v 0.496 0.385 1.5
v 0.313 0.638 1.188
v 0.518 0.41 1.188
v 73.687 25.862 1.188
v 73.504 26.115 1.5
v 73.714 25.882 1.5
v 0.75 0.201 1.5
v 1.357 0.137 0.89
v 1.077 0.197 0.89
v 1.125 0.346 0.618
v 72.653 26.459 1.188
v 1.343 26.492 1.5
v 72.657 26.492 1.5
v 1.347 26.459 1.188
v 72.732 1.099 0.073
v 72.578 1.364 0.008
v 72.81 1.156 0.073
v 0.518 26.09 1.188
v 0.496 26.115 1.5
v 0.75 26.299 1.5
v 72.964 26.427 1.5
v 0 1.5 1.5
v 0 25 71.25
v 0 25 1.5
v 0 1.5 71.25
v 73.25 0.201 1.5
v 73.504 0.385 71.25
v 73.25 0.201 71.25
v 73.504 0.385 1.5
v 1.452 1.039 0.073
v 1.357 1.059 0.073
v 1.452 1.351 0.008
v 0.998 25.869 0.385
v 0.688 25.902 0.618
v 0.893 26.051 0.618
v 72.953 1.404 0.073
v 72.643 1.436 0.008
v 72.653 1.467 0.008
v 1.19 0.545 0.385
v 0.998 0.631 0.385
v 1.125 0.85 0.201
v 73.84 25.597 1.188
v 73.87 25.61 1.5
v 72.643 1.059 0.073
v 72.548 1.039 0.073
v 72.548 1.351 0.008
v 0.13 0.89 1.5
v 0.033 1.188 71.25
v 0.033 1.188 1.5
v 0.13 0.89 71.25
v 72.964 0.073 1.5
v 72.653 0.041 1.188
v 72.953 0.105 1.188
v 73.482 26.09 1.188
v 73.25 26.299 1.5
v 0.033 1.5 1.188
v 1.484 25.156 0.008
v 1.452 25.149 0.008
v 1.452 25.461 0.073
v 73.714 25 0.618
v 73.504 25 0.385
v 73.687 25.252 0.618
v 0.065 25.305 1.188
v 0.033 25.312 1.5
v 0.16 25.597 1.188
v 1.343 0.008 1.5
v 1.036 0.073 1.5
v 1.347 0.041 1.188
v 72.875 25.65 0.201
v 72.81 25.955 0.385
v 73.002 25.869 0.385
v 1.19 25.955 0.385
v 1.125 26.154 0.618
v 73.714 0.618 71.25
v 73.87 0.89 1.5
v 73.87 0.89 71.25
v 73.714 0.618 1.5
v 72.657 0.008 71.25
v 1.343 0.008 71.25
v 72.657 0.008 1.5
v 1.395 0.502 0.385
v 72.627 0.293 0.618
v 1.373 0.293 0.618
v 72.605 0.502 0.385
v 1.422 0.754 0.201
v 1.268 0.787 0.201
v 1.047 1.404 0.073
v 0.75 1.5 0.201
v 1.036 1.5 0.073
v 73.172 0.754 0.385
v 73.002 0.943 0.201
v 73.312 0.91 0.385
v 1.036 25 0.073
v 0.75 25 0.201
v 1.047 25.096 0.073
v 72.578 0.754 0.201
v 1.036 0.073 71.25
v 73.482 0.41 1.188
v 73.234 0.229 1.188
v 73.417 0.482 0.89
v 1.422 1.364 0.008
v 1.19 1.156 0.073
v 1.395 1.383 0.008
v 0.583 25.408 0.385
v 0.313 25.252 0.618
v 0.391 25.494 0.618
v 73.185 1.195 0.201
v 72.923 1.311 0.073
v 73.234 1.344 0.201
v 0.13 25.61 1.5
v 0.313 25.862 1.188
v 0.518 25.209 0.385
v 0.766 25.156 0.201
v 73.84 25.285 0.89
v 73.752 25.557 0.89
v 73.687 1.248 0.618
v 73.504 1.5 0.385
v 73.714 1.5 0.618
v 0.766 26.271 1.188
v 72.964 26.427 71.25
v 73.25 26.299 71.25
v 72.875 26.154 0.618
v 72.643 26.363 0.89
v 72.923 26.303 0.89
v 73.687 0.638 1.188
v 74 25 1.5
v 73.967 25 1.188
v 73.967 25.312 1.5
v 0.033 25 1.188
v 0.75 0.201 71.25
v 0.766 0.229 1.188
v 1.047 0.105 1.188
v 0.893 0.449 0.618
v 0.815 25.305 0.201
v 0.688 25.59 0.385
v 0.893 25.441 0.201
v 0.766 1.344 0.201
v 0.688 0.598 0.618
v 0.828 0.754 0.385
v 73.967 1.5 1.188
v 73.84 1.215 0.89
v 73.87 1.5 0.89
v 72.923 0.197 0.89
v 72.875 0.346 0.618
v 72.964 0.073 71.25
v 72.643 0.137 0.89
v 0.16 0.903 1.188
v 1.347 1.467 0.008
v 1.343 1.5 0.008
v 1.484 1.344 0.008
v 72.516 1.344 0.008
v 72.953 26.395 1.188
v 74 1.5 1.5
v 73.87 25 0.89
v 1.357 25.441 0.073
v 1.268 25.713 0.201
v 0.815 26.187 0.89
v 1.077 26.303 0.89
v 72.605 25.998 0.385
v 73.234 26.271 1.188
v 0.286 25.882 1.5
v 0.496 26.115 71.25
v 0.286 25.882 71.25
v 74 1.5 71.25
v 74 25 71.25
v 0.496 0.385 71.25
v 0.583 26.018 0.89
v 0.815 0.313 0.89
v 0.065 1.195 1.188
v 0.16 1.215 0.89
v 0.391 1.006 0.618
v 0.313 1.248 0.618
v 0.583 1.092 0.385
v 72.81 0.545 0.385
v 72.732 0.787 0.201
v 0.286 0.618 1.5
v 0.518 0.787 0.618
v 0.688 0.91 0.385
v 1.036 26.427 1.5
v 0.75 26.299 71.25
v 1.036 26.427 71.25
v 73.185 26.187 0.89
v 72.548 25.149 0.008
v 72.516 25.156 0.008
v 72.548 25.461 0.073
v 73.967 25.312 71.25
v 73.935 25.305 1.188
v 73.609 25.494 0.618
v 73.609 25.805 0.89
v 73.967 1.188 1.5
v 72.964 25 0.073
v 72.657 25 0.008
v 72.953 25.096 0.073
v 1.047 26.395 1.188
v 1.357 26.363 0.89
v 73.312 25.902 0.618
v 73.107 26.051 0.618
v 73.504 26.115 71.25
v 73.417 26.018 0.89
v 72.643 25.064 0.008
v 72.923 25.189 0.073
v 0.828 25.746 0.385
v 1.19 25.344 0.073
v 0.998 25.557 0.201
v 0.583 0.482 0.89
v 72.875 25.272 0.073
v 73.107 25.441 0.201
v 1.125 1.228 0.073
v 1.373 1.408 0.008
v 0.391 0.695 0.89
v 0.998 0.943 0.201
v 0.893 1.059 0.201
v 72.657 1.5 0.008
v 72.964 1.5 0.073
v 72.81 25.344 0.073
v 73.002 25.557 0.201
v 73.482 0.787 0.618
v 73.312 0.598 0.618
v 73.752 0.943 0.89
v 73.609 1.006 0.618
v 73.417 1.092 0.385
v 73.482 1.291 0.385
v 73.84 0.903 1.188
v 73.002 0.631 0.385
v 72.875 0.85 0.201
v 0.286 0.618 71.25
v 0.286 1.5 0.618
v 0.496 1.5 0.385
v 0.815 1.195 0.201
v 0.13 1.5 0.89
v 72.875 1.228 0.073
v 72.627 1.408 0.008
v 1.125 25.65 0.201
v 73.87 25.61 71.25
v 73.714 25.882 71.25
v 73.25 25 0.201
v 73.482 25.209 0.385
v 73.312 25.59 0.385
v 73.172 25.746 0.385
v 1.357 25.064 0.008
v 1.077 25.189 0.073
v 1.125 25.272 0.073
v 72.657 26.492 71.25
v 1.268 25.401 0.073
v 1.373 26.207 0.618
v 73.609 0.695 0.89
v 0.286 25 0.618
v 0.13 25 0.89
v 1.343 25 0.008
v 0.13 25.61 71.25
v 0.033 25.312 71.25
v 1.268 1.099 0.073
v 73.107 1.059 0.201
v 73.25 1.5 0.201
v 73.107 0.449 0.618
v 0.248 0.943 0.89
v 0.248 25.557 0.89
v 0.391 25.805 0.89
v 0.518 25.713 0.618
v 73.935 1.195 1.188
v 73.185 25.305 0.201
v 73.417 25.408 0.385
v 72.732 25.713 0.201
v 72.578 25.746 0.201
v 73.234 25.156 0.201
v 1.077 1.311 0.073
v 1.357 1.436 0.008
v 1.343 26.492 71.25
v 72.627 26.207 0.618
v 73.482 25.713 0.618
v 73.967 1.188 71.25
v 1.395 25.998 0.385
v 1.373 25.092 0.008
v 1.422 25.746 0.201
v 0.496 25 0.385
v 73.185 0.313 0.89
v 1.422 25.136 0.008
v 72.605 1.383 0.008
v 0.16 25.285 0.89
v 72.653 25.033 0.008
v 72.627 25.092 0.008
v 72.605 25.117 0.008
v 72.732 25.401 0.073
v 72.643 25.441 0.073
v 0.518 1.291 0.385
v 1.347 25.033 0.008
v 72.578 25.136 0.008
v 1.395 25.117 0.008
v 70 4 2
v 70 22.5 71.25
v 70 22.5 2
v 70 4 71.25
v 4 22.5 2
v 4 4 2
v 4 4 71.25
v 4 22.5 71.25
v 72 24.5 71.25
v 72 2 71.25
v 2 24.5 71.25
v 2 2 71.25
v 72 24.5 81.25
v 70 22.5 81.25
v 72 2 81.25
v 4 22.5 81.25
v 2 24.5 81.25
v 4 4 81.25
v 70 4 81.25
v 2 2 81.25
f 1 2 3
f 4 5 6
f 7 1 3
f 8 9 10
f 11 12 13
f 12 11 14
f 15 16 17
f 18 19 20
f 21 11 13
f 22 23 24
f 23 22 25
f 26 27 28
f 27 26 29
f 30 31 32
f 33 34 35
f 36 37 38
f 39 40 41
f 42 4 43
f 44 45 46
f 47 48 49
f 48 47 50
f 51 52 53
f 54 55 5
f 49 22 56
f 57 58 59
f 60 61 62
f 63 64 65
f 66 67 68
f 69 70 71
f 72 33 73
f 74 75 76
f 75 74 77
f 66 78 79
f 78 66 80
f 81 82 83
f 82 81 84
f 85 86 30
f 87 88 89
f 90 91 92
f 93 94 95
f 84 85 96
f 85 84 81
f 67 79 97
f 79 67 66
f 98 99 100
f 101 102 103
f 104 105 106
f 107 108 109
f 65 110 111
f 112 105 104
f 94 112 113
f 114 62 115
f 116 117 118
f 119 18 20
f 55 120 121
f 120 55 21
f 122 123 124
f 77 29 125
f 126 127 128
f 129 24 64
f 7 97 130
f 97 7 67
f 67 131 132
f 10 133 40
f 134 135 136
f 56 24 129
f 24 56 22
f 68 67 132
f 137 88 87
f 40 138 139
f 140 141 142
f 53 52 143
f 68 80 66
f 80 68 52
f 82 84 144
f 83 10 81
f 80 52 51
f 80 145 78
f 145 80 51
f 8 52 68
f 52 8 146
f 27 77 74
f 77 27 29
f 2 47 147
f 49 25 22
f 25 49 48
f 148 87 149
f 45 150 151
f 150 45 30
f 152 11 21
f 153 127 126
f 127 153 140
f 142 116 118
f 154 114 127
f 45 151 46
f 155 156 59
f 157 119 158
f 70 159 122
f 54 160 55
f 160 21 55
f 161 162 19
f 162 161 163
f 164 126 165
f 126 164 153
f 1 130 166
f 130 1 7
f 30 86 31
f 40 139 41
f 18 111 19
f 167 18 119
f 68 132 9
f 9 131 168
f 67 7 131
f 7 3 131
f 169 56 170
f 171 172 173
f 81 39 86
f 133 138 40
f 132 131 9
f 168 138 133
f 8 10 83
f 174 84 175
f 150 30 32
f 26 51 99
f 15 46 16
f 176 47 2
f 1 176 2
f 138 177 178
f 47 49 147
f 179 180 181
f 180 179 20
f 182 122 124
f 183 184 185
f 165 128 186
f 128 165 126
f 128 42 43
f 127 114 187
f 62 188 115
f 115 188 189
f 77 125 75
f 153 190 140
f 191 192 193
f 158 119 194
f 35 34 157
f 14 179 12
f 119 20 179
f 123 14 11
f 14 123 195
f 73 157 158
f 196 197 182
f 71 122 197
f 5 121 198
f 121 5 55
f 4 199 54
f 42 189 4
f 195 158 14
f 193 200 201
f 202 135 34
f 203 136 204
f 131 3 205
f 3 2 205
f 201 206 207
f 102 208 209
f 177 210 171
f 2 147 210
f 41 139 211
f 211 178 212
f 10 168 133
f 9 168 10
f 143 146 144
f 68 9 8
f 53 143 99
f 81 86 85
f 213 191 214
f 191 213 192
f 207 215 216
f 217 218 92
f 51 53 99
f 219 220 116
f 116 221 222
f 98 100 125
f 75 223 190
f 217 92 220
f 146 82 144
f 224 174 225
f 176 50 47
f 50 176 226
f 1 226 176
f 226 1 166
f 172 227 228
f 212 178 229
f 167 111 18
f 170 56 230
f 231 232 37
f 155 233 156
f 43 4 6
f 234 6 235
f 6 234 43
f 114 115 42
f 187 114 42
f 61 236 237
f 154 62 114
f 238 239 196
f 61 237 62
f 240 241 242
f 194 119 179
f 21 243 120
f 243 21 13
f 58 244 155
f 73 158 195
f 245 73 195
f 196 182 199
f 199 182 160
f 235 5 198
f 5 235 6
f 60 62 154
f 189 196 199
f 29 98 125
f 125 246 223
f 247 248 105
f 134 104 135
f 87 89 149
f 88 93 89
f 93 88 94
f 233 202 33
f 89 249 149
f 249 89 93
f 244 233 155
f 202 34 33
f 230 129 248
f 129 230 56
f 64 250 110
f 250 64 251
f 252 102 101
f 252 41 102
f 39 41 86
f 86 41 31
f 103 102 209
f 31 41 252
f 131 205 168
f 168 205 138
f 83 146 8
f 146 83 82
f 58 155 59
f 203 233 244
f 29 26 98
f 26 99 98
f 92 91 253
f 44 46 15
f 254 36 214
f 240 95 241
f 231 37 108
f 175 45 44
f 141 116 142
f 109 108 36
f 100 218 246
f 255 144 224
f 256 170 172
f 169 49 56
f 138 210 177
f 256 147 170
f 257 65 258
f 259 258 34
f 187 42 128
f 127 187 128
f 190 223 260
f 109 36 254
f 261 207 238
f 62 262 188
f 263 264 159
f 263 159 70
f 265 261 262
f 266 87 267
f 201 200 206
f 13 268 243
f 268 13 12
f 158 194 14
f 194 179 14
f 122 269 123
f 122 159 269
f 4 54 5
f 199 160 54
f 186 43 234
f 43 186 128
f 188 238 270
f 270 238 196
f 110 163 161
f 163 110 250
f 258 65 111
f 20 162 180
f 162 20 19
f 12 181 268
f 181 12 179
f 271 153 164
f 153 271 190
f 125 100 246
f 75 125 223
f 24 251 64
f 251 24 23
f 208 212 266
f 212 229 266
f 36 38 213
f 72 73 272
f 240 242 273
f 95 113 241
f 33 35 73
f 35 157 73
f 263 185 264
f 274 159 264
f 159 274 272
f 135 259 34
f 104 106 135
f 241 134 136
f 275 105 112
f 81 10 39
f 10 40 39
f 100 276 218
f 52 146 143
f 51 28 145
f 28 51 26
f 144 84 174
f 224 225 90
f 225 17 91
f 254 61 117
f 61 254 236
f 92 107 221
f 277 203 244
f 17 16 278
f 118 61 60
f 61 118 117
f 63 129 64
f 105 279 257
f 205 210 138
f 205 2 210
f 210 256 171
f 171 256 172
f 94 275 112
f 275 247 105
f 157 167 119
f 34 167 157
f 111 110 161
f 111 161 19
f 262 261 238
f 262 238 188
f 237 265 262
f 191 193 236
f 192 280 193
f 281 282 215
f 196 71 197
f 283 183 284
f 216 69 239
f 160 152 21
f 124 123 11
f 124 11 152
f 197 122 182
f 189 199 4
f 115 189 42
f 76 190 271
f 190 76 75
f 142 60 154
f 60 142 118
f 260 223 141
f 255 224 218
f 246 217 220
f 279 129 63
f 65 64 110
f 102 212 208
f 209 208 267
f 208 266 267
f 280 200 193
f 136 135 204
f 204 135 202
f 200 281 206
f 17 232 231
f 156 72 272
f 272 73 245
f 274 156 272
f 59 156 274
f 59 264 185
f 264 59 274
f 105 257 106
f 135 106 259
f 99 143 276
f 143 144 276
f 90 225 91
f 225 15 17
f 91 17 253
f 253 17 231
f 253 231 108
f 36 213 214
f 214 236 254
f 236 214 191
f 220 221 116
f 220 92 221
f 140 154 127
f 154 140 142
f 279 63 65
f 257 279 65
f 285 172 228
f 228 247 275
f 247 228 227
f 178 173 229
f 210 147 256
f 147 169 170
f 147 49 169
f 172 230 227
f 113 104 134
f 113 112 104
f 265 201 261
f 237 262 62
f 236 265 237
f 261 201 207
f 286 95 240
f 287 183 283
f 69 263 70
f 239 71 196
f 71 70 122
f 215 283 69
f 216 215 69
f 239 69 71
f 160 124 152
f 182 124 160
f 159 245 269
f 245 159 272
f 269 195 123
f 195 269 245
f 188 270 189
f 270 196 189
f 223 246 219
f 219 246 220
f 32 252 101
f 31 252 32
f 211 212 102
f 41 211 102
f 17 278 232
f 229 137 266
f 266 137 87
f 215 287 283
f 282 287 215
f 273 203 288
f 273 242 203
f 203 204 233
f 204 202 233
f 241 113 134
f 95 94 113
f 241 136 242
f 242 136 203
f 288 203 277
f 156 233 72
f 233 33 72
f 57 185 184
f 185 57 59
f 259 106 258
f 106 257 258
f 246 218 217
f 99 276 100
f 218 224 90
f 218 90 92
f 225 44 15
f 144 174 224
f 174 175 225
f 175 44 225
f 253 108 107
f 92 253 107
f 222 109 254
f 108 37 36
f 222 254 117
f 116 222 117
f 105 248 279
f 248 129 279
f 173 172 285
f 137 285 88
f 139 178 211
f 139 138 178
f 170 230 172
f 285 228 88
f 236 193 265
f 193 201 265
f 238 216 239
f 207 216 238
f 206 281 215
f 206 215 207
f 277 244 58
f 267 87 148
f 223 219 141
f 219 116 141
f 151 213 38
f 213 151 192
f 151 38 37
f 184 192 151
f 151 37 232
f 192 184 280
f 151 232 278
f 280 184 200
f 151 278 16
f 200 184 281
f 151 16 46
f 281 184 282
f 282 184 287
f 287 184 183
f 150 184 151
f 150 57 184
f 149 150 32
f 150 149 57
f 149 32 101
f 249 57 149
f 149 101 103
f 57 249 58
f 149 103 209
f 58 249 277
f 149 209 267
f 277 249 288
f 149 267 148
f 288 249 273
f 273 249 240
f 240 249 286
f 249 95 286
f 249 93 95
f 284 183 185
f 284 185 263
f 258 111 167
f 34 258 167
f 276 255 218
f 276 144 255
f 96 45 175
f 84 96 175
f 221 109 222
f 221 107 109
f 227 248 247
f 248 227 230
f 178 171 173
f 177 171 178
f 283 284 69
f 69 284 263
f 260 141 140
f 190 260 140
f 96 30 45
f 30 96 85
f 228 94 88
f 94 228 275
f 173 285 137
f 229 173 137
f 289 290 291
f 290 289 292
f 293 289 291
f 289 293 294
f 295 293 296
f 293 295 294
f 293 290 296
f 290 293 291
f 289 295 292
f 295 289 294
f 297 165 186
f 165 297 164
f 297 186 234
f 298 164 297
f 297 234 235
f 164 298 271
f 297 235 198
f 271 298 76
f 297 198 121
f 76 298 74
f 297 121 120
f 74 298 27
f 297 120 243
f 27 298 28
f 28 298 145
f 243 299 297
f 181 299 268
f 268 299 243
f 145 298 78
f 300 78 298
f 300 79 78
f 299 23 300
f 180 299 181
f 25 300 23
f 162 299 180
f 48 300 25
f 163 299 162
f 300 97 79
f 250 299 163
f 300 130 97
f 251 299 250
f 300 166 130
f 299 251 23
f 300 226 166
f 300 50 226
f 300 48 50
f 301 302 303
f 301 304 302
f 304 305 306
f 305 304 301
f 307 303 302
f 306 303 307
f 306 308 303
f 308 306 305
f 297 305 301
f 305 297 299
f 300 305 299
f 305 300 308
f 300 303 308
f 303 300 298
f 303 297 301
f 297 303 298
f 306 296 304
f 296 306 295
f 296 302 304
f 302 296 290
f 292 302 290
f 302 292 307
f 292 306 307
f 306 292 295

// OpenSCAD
// file: ../CustomCardCase.scad
// Units will be interpreted as millimeters.

// What fraction of the case length will be lid?
lid_fraction = 0.25;

// Extra space for a more reasonable fit
card_fit_padding=2;

module _outer_case_shell(shell_dimensions)
{
    $fn=30;
    fillet_radius=1.5;
    minkowski() {
        cube([
            shell_dimensions.x - 2 * fillet_radius,
            shell_dimensions.y - 2 * fillet_radius,
            shell_dimensions.z - 2 * fillet_radius
            ],
            center=true);
        sphere(fillet_radius);
    }
}

// minimum_wall_width should be customized based on printer line width
module custom_card_case_bottom(card_width, card_height, deck_depth, minimum_wall_width=2, center=true)
{
    module lid_inset(inner_dimensions, wall_width, overlap_depth)
    {
        linear_extrude(height = overlap_depth, center = true) {
            difference() {
                square([inner_dimensions.x + 2 * wall_width, inner_dimensions.y + 2 * wall_width], center=true);
                square([inner_dimensions.x, inner_dimensions.y], center=true);
            }
        }
    }

    module apply_final_position(outer_dimensions, lid_height, lid_overlap_depth)
    {
        if (center) {
            translate([0, 0, (lid_height - lid_overlap_depth)/2]) {
                children();
            }
        }
        else {
            translate(outer_dimensions/2) {
                children();
            }
        }
    }

    inner_dimensions = [
        card_width + card_fit_padding,
        deck_depth + card_fit_padding,
        card_height + card_fit_padding
    ];

    outer_dimensions = inner_dimensions + [4 * minimum_wall_width, 4 * minimum_wall_width, 2 * minimum_wall_width];

    lid_height = lid_fraction * outer_dimensions.z;
    lid_overlap_depth = 10;

    assert(lid_overlap_depth < lid_height - minimum_wall_width - 4);

    apply_final_position(outer_dimensions, lid_height, lid_overlap_depth) {
        union() {
            difference() {
                _outer_case_shell(outer_dimensions);
                cube(inner_dimensions, center=true);
                translate([0, 0,(outer_dimensions.z / 2) - (lid_height / 2)]) {
                    cube([outer_dimensions.x, outer_dimensions.y, lid_height], center=true);
                }
            }
            translate([0, 0, (outer_dimensions.z / 2) - lid_height + (lid_overlap_depth / 2)]) {
                lid_inset(inner_dimensions, minimum_wall_width, lid_overlap_depth);
            }
        }
    }
}

// minimum_wall_width should be customized based on printer line width
module custom_card_case_top(card_width, card_height, deck_depth, minimum_wall_width=2, center=true)
{
    module apply_final_position(outer_dimensions, lid_height)
    {
        if (center) {
            translate([0, 0, outer_dimensions.z/2 - lid_height/2]) {
                children();
            }
        }
        else {
            translate(outer_dimensions/2) {
                children();
            }
        }
    }

    inner_dimensions = [
        card_width + card_fit_padding + 2 * minimum_wall_width,
        deck_depth + card_fit_padding + 2 * minimum_wall_width,
        card_height + card_fit_padding
    ];

    outer_dimensions = inner_dimensions + [2 * minimum_wall_width, 2 * minimum_wall_width, 2 * minimum_wall_width];

    lid_height = lid_fraction * outer_dimensions.z;

    apply_final_position(outer_dimensions, lid_height) {
        union() {
            difference() {
                _outer_case_shell(outer_dimensions);
                cube(inner_dimensions, center=true);
                translate([0, 0, lid_height]) {
                    cube([outer_dimensions.x, outer_dimensions.y, outer_dimensions.z], center=true);
                }
            }
        }
    }
}
// main file
use <../CustomCardCase.scad>

custom_card_case_bottom(card_width=64, card_height=89, deck_depth=16.5, center=false);
